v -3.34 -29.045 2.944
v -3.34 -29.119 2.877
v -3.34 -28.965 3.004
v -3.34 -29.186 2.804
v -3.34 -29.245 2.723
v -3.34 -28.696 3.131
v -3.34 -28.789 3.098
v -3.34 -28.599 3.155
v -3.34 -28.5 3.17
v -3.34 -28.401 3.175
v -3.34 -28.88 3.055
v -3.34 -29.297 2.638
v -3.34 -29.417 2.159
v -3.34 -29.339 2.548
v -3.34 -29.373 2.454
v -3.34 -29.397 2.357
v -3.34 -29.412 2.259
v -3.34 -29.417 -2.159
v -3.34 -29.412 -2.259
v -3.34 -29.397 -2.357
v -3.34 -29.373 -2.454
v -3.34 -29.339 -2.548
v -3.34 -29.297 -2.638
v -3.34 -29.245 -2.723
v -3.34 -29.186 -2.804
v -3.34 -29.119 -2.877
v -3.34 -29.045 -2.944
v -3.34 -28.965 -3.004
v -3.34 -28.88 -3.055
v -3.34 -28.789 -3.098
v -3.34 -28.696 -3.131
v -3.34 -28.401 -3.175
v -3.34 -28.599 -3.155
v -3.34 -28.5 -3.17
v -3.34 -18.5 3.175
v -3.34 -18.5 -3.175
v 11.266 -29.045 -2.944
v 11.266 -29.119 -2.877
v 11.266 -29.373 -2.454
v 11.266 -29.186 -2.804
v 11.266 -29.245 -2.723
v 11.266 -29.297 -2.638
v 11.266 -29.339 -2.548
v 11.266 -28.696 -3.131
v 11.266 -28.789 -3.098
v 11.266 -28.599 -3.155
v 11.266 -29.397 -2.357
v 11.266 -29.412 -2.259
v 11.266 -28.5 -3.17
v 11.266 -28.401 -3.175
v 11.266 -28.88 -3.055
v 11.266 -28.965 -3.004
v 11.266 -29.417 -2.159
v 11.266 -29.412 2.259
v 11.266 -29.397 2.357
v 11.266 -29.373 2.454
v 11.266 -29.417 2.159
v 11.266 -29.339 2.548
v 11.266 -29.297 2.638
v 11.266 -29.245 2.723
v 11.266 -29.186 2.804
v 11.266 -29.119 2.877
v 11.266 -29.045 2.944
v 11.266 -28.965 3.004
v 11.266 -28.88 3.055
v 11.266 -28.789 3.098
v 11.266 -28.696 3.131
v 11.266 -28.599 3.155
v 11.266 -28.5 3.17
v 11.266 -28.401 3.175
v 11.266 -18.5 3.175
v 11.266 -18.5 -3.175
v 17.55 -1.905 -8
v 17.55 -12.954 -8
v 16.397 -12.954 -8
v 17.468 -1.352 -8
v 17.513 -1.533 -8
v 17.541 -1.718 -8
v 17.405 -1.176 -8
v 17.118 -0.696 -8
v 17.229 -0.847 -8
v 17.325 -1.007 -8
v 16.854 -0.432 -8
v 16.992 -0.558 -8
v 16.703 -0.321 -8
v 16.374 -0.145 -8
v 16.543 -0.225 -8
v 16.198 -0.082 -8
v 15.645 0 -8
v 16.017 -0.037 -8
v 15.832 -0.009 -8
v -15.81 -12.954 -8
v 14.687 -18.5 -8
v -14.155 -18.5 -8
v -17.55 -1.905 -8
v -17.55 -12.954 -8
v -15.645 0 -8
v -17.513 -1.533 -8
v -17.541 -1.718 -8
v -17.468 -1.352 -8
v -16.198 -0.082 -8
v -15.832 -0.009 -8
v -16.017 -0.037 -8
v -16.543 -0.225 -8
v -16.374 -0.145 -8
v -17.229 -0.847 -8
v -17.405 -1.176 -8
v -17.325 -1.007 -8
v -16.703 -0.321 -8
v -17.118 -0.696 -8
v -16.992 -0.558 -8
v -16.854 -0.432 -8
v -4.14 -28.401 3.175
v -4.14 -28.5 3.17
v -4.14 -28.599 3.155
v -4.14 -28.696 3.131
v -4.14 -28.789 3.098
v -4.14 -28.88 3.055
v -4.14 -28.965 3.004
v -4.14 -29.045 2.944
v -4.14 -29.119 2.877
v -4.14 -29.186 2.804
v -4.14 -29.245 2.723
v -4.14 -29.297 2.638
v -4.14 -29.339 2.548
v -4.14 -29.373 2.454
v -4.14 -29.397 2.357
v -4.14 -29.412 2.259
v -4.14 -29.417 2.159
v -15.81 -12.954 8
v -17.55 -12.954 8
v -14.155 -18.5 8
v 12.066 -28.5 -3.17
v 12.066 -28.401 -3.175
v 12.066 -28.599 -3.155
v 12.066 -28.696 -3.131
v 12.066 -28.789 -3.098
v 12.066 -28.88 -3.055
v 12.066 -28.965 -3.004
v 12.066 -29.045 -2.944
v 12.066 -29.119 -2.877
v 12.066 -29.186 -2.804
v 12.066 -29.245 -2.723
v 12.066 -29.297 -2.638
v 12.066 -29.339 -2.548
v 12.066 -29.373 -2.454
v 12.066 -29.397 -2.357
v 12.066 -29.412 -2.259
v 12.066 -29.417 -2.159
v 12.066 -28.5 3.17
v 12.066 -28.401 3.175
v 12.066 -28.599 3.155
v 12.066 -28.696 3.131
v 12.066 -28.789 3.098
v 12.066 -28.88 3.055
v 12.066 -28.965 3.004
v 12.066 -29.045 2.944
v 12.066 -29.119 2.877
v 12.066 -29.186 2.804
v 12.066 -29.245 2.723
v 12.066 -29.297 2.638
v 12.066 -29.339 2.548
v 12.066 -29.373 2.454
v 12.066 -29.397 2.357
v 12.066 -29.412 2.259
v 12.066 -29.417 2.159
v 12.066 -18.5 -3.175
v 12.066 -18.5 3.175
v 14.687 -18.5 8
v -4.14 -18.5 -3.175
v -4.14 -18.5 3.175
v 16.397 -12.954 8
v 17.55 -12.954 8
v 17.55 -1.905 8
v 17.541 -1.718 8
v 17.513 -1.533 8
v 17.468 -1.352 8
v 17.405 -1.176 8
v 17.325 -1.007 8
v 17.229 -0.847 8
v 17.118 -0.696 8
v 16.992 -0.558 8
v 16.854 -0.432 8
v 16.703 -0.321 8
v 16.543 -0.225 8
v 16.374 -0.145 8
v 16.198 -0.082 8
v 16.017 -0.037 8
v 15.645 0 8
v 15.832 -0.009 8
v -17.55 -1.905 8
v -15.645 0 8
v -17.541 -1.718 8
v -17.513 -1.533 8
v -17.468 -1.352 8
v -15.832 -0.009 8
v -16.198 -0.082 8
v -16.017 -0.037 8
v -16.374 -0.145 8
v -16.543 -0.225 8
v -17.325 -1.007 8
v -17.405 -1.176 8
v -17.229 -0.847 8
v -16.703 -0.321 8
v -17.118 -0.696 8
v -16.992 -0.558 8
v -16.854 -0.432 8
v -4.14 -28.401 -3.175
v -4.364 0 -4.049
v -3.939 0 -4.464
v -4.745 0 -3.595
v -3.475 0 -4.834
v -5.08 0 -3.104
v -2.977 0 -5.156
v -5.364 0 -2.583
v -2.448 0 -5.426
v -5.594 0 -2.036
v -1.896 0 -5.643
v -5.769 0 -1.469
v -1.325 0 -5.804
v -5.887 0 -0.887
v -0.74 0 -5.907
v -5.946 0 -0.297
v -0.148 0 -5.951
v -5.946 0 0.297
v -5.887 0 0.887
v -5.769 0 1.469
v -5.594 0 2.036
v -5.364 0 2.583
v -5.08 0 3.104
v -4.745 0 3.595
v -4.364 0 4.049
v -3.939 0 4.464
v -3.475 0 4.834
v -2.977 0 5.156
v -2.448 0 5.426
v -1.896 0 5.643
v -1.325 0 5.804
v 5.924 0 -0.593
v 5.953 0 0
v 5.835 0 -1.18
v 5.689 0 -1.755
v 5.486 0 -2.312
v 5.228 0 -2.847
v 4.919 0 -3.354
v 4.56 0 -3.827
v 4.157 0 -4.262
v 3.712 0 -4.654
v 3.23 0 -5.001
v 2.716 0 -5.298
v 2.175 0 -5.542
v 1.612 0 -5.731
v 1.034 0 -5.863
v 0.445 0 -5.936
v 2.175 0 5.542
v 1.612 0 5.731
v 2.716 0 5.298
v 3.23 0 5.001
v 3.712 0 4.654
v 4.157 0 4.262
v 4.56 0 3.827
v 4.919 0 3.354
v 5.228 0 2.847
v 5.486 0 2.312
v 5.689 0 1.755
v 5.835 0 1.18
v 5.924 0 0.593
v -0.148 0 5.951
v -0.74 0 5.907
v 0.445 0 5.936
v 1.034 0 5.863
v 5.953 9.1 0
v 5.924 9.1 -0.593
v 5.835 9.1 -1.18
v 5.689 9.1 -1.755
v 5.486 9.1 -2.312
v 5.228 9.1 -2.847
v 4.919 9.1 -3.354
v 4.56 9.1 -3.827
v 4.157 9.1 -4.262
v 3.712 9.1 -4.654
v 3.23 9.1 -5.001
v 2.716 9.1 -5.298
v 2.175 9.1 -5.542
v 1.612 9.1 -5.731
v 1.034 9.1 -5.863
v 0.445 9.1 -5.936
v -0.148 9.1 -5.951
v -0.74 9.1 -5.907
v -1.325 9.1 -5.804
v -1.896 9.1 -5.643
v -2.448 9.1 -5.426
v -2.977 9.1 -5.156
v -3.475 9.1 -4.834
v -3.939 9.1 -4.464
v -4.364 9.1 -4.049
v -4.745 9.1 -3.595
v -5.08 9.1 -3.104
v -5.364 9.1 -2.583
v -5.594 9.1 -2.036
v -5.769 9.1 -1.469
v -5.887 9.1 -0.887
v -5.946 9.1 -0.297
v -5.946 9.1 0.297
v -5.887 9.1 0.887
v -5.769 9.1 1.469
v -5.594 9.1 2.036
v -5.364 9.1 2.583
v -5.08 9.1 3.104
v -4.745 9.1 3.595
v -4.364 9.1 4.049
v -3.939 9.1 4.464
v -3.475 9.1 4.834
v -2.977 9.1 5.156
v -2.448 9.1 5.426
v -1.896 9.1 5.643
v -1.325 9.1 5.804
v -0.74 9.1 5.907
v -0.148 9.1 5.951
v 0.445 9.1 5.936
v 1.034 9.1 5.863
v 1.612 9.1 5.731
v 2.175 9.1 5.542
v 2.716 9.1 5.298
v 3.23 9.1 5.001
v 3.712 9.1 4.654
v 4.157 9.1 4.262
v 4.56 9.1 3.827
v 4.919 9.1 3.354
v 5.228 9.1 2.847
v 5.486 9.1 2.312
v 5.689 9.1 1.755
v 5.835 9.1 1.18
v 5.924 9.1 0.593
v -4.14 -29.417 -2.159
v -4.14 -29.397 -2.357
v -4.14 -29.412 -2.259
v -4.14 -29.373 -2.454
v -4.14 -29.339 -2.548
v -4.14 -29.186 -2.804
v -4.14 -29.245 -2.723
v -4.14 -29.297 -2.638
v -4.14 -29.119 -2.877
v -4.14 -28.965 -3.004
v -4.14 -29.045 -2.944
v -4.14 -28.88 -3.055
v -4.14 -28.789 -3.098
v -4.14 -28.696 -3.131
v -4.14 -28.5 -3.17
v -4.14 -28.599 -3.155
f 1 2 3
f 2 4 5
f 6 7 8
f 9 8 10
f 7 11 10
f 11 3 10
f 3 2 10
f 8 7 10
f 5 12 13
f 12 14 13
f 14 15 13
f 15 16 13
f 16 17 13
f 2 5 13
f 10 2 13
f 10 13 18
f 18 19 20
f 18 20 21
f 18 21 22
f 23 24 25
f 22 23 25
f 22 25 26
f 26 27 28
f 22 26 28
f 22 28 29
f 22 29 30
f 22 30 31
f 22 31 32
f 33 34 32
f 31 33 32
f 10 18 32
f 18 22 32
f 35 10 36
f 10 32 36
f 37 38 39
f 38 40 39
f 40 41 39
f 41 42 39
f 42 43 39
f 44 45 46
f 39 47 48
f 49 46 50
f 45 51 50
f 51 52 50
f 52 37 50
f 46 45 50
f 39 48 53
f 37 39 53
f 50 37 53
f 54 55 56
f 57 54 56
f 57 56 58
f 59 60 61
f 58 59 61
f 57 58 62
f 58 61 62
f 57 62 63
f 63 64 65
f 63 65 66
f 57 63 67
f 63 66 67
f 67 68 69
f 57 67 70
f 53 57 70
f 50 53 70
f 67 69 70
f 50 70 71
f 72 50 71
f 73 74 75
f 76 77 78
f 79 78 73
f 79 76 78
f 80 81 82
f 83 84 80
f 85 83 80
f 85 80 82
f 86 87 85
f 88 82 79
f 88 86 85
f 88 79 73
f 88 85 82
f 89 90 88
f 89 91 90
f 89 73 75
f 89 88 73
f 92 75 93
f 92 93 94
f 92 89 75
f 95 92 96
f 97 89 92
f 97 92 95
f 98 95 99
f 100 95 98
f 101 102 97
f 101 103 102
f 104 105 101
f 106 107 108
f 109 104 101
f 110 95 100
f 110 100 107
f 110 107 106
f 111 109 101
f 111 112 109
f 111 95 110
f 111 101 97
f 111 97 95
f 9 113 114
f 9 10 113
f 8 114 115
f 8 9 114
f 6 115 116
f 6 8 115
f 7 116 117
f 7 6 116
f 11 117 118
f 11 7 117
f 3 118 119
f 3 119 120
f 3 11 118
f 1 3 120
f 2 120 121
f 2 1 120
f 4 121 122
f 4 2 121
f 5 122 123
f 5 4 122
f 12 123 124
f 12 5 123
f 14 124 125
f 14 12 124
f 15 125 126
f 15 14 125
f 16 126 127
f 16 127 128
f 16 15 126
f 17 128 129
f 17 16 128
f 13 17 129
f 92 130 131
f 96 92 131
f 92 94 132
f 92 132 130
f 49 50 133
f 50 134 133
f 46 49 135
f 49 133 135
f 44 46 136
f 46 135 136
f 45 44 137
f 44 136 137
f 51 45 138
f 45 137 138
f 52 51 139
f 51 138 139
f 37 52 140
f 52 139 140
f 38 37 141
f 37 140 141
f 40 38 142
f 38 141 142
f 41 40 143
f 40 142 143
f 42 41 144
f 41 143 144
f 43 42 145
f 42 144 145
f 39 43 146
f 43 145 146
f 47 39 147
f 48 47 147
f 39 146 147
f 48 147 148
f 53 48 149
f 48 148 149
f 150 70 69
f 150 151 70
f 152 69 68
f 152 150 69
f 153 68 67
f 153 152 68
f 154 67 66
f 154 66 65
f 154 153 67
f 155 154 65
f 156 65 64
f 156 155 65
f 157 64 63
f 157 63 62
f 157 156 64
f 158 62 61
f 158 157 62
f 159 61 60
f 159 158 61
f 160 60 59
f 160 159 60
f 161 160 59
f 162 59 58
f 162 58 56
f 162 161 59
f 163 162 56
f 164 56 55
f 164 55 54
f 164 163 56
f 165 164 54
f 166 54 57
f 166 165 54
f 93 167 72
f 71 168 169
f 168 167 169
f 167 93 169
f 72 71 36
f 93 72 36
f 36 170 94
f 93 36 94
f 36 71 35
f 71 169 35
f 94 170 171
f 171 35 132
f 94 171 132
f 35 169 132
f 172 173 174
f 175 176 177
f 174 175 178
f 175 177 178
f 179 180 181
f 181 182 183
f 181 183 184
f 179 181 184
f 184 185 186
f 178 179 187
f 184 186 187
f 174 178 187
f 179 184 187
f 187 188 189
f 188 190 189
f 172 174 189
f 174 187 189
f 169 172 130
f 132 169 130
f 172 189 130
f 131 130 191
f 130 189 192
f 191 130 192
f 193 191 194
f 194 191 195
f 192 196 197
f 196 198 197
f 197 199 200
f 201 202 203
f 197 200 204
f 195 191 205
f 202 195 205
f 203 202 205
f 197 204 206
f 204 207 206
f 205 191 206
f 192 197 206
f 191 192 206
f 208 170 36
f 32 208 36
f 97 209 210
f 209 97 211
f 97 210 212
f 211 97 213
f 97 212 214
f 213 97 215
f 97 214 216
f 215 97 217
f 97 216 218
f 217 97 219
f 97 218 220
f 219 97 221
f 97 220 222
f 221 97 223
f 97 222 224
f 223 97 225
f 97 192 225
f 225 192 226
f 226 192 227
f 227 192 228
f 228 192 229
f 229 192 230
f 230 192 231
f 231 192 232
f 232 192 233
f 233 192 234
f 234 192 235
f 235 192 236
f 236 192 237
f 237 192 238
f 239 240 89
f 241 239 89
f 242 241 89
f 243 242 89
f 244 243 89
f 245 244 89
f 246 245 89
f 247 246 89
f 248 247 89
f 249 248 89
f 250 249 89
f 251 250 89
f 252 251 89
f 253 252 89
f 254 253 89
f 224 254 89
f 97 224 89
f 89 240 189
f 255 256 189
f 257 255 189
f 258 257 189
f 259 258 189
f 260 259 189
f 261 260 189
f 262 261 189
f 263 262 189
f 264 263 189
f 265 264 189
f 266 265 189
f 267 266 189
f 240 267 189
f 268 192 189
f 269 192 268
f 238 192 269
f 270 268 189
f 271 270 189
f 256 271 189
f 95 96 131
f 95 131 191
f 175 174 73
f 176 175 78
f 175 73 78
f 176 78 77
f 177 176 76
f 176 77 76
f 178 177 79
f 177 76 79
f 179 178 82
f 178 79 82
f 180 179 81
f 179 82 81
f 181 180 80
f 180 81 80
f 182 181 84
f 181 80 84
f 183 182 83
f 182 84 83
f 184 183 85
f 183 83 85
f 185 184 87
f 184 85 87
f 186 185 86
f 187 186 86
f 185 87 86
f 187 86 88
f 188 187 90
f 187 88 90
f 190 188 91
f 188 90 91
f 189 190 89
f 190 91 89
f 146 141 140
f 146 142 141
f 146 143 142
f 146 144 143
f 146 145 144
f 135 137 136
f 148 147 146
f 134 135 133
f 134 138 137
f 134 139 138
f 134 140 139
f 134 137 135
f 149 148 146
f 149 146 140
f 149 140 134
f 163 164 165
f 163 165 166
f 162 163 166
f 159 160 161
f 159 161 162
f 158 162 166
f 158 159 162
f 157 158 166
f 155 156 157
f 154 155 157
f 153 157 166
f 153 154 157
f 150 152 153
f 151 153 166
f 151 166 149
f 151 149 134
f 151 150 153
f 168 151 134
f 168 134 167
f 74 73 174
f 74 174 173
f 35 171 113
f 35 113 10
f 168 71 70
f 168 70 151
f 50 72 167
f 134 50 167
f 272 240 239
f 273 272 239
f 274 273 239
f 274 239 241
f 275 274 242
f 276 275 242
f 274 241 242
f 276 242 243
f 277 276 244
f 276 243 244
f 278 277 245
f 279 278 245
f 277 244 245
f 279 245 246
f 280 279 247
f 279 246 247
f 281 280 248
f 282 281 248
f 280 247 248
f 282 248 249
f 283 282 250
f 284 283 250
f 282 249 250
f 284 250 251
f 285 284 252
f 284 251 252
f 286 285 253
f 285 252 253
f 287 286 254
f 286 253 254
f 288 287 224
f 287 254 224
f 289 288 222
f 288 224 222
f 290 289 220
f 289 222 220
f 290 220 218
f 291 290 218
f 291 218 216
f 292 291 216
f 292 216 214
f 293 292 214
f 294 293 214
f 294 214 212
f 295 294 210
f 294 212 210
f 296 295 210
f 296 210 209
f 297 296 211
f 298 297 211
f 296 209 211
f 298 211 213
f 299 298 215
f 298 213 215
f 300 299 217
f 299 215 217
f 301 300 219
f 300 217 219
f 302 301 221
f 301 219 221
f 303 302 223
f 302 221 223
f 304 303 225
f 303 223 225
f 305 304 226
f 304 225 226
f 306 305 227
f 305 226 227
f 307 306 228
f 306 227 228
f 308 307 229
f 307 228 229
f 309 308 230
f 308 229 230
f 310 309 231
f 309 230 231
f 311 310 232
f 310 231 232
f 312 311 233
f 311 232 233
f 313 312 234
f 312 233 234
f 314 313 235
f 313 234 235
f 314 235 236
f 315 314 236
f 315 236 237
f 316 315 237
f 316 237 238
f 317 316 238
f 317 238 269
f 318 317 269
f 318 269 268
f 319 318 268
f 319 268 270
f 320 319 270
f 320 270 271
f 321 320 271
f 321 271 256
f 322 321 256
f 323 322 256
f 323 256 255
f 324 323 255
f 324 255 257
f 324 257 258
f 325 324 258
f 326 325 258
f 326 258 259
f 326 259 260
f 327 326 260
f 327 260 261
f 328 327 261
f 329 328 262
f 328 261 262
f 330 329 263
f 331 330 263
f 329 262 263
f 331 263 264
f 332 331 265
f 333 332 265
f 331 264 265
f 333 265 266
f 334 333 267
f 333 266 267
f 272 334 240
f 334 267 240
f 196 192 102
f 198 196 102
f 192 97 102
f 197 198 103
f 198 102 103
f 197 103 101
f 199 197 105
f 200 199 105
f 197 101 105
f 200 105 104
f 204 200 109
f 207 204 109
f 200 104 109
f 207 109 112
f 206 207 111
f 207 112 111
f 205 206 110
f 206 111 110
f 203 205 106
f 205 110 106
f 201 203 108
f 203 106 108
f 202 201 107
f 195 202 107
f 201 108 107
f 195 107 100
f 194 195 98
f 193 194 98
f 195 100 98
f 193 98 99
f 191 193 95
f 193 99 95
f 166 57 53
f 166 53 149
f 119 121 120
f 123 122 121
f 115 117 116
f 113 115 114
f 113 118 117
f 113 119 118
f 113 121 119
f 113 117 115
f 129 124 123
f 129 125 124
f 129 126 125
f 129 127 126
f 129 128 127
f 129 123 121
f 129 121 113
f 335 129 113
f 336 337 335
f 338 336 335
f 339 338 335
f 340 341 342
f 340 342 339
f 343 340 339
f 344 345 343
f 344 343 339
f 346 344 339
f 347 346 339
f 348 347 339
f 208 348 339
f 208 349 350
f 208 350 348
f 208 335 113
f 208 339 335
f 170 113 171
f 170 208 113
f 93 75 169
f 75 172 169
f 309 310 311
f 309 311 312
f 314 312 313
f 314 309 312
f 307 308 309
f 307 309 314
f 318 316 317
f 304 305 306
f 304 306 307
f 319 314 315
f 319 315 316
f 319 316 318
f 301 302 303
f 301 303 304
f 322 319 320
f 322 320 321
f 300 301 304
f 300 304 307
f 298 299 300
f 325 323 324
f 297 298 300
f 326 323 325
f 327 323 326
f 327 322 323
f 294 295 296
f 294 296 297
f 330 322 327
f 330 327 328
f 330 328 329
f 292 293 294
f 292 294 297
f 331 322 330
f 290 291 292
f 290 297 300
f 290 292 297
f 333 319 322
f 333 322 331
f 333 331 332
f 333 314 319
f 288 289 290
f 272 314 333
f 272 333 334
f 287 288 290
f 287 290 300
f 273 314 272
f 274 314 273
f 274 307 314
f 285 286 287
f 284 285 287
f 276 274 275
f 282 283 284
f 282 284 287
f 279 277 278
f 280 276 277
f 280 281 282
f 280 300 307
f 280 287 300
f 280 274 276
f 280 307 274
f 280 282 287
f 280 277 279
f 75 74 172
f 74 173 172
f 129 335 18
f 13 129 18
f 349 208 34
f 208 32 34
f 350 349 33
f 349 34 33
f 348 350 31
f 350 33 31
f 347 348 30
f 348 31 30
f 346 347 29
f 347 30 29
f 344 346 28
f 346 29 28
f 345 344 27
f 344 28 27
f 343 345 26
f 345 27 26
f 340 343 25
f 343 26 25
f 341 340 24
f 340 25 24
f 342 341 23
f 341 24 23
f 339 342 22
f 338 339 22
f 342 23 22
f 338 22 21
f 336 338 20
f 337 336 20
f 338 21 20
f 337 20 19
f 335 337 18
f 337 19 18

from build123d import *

# Parameters (mm, degrees)
BOSS_EXTRUDE1_DEPTH = 8
FILLET1_R           = 1.905
SKETCH2_R           = 5.953125
BOSS_EXTRUDE2_DEPTH = 9.1
SKETCH1_4_W         = 0.8
SKETCH1_4_H         = 10.916687254
EXTRUDE_THIN1_DEPTH = 3.175
FILLET2_R           = 1.016


with BuildPart() as part:
    # Sketch1 → Boss-Extrude1 (new, symmetric)
    with BuildSketch(Plane.XY):
        Polygon((-17.55, 0), (-17.55, -12.953853844), (-15.810469007, -12.953853844), (-14.154511139, -18.5), (-3.740094375, -18.5), (11.66595999, -18.5), (14.686720063, -18.5), (16.396875628, -12.953853844), (17.55, -12.953853844), (17.55, 0), align=None)
    extrude(amount=BOSS_EXTRUDE1_DEPTH, both=True)

    # Fillet1
    fillet1_edges = [part.edges().sort_by_distance(p)[0] for p in [
        (-17.55, 0, 0),
        (17.55, 0, 0),
    ]]
    fillet(fillet1_edges, radius=FILLET1_R)

    # Sketch2 → Boss-Extrude2 (add)
    with BuildSketch(Plane(origin=(0, 0, 0), x_dir=(1, 0, 0), z_dir=(0, 1, 0))):
        Circle(SKETCH2_R)
    extrude(amount=BOSS_EXTRUDE2_DEPTH)

    # Sketch1_4 → Extrude-Thin1 (add, symmetric)
    with BuildSketch(Plane.XY):
        with Locations((-3.740094375, -23.958343627)):
            Rectangle(SKETCH1_4_W, SKETCH1_4_H)
        with Locations((11.66595999, -23.958343627)):
            Rectangle(SKETCH1_4_W, SKETCH1_4_H)
    extrude(amount=EXTRUDE_THIN1_DEPTH, both=True)

    # Fillet2
    fillet2_edges = [part.edges().sort_by_distance(p)[0] for p in [
        (-3.740094375, -29.416687254, -3.175),
        (11.66595999, -29.416687254, -3.175),
        (-3.740094375, -29.416687254, 3.175),
        (11.66595999, -29.416687254, 3.175),
    ]]
    fillet(fillet2_edges, radius=FILLET2_R)


solid = part.part
